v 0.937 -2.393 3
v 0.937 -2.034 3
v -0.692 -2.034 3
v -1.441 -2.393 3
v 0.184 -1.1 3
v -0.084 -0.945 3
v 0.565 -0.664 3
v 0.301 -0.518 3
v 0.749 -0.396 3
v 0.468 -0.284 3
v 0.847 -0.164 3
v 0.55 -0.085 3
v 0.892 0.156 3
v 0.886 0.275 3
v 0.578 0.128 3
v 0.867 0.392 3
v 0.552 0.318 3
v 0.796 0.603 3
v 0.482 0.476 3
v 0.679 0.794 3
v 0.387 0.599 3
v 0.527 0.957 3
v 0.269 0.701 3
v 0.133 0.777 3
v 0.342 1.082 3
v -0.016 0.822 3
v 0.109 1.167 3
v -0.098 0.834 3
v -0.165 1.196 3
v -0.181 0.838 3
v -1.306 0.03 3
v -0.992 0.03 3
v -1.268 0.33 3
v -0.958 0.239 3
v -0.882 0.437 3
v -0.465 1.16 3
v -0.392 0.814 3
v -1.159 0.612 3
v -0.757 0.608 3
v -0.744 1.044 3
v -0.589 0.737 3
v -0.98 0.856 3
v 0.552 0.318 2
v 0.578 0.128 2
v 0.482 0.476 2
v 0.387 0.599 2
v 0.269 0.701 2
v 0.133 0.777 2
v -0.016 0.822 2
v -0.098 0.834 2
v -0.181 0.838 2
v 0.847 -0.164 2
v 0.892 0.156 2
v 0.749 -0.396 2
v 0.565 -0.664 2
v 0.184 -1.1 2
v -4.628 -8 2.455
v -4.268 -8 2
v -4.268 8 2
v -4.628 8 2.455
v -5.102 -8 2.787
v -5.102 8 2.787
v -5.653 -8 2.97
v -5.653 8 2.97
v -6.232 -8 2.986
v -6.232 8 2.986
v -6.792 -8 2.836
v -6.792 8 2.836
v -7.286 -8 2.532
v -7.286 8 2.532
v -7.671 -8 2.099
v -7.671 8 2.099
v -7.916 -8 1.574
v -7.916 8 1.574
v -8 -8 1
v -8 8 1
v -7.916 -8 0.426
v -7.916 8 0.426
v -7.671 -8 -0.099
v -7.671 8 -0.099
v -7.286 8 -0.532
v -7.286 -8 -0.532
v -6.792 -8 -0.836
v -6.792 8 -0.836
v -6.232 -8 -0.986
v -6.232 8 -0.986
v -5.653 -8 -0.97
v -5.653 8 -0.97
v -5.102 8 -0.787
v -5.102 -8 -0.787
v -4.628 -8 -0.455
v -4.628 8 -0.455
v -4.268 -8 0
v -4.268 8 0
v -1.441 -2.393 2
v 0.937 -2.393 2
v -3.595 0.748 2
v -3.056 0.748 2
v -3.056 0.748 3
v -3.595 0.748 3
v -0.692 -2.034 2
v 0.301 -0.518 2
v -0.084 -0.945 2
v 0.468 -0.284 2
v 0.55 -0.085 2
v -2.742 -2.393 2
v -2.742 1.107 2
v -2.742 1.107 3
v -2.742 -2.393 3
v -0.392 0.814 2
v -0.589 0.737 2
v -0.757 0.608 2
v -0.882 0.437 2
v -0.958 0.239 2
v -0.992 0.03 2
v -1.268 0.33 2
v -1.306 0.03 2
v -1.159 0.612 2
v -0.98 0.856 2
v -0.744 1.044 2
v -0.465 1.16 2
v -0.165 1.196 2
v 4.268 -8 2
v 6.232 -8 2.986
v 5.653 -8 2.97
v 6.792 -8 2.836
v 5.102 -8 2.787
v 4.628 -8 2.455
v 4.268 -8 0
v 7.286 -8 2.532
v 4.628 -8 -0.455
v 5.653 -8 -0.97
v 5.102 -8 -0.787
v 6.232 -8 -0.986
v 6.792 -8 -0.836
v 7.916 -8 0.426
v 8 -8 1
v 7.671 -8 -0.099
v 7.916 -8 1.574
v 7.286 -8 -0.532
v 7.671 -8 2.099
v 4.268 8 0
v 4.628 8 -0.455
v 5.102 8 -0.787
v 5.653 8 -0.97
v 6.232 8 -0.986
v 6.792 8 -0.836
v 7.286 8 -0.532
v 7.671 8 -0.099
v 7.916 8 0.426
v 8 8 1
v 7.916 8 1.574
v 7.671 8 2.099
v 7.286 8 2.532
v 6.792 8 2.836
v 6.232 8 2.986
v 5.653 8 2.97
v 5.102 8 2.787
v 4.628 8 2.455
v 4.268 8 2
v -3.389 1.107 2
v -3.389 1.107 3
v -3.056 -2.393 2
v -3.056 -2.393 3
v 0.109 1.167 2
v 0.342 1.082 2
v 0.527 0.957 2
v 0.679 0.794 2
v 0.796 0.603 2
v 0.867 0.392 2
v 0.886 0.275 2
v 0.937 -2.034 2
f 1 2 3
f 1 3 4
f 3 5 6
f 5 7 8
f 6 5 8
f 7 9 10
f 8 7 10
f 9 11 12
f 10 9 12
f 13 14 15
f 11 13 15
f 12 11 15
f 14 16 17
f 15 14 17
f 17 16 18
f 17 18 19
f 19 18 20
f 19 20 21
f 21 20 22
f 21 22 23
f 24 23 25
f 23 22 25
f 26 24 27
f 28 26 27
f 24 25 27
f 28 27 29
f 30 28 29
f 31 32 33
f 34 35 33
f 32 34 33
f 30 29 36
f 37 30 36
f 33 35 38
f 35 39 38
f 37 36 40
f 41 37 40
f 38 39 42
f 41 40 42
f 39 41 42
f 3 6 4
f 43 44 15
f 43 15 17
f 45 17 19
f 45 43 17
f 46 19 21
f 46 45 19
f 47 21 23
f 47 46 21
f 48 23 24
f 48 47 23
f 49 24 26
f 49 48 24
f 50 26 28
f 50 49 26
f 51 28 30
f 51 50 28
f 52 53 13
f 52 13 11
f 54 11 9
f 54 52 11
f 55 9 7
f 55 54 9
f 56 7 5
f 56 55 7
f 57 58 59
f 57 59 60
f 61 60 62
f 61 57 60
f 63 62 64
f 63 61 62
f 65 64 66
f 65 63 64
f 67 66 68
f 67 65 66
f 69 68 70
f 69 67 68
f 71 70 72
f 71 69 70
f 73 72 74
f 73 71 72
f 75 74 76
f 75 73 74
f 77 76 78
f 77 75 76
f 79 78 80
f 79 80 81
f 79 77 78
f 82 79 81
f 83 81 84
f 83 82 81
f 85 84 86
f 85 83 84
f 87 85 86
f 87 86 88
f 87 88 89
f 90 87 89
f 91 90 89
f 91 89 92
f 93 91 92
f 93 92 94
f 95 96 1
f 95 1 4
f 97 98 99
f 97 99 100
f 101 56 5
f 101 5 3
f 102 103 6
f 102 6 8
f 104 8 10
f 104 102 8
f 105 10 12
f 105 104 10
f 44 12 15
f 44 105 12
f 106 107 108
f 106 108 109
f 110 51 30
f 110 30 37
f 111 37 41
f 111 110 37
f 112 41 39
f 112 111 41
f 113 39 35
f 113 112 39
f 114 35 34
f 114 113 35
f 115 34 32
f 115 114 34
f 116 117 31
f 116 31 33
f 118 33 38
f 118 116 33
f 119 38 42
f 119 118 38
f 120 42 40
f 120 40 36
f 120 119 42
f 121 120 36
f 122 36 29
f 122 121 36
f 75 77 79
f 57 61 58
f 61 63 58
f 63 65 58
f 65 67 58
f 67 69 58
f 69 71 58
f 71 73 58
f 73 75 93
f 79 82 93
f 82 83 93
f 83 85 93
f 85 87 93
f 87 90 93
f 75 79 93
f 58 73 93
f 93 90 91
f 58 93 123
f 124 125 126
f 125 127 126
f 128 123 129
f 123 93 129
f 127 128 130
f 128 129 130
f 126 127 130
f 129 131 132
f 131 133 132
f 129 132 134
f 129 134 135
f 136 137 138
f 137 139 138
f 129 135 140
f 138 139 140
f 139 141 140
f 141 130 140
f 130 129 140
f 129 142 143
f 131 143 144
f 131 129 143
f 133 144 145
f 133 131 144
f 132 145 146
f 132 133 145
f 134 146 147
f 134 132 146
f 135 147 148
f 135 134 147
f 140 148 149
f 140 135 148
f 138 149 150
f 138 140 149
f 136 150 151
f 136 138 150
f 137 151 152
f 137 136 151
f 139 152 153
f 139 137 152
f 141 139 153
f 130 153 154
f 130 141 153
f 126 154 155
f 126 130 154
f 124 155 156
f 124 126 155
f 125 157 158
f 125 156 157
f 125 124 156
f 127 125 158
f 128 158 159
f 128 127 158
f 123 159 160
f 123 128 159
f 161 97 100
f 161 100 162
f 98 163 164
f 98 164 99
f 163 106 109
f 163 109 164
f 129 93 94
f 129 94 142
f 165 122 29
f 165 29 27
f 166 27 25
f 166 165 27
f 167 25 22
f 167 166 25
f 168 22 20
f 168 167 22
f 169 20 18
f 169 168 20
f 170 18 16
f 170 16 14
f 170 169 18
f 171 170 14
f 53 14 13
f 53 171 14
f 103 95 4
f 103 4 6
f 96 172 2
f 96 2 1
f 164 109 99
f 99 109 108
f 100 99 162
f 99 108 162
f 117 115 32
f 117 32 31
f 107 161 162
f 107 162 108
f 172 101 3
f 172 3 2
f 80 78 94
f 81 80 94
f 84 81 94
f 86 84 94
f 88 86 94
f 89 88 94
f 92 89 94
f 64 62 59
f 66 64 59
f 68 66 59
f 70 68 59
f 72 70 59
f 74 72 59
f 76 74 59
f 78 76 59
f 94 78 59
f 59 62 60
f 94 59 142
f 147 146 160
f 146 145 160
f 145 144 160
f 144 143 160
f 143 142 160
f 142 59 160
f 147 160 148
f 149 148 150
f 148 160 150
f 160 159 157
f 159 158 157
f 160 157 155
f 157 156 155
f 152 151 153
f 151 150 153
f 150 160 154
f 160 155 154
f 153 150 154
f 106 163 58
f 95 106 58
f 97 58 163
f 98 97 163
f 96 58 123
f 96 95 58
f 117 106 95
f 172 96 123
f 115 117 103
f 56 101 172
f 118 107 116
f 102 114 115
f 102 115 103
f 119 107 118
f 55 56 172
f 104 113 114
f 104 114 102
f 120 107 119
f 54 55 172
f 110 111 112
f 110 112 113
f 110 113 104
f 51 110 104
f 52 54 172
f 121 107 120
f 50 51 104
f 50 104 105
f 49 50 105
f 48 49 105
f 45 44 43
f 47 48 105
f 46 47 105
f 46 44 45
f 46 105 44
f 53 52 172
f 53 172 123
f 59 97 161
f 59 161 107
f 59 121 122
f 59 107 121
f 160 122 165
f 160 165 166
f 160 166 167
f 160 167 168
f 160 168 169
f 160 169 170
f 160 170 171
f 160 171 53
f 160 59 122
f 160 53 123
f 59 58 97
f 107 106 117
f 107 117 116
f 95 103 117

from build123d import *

# Parameters (mm, degrees)
SKETCH1_W           = 12
SKETCH1_H           = 16
BOSS_EXTRUDE1_DEPTH = 2
SKETCH4_R           = 2
BOSS_EXTRUDE4_DEPTH = 16
BOSS_EXTRUDE5_DEPTH = 1


with BuildPart() as part:
    # Sketch1 → Boss-Extrude1 (new body)
    with BuildSketch(Plane.XY):
        Rectangle(SKETCH1_W, SKETCH1_H)
    extrude(amount=BOSS_EXTRUDE1_DEPTH)

    # Sketch4 → Boss-Extrude4 (add)
    with BuildSketch(Plane.XZ.offset(8)):
        with Locations((-6, 1)):
            Circle(SKETCH4_R)
        with Locations((6, 1)):
            Circle(SKETCH4_R)
    extrude(amount=-BOSS_EXTRUDE4_DEPTH)

    # Sketch5 → Boss-Extrude5 (add)
    with BuildSketch(Plane.XY.offset(2)):
        Polygon((-3.389443583, 1.106736913), (-2.742308167, 1.106736913), (-2.742308167, -2.393263087), (-3.056410731, -2.393263087), (-3.056410731, 0.747762554), (-3.594872269, 0.747762554), align=None)
        with BuildLine():
            Line((-0.992308167, 0.029813837), (-1.306410731, 0.029813837))
            add(Edge.make_bspline(
                [(-1.306410731, 0.029813837), (-1.304363578, 0.071484724), (-1.300343024, 0.153325239), (-1.281514735, 0.272649145), (-1.254573857, 0.386703944), (-1.216482403, 0.494573858), (-1.169176126, 0.597212665), (-1.112446098, 0.694212681), (-1.045252248, 0.78520387), (-0.969045514, 0.869342713), (-0.886276875, 0.946530284), (-0.796970935, 1.013185526), (-0.703125908, 1.069503198), (-0.605026509, 1.11658444), (-0.501565945, 1.151924286), (-0.393683087, 1.178145925), (-0.280903951, 1.193922271), (-0.204063929, 1.195618057), (-0.164984449, 1.196480503)],
                knots=[0, 0, 0, 0, 0.000125083, 0.00024566, 0.000361805, 0.000476223, 0.000588214, 0.000700404, 0.000812728, 0.00092691, 0.001040529, 0.001151727, 0.001260545, 0.001368429, 0.001477521, 0.001587884, 0.001701119, 0.00181831, 0.00181831, 0.00181831, 0.00181831], degree=3))
            add(Edge.make_bspline(
                [(-0.164984449, 1.196480503), (-0.126606375, 1.195582047), (-0.05119483, 1.193816612), (0.058867184, 1.178655583), (0.163644479, 1.154909991), (0.262932245, 1.121594575), (0.35593831, 1.076810147), (0.443361354, 1.023012609), (0.526242165, 0.960792777), (0.600848949, 0.887538964), (0.669357028, 0.809336579), (0.728459283, 0.725848676), (0.779072447, 0.63961939), (0.821260127, 0.549991188), (0.852316266, 0.45612016), (0.875894474, 0.359372957), (0.889221887, 0.258748146), (0.891267311, 0.190641591), (0.892307218, 0.15601576)],
                knots=[0, 0, 0, 0, 0.000115089, 0.000226145, 0.000332614, 0.000437044, 0.000539592, 0.000641561, 0.000744629, 0.00084975, 0.000954621, 0.001056175, 0.001156101, 0.001254284, 0.001352726, 0.001452208, 0.001552655, 0.001656537, 0.001656537, 0.001656537, 0.001656537], degree=3))
            add(Edge.make_bspline(
                [(0.892307218, 0.15601576), (0.890613955, 0.107267925), (0.887257144, 0.010627711), (0.858542767, -0.131387151), (0.813696256, -0.26898057), (0.759698899, -0.379717873), (0.705226455, -0.468951366), (0.656138947, -0.542420071), (0.598674136, -0.62152554), (0.531995638, -0.706002877), (0.457482766, -0.796513782), (0.374460603, -0.893003578), (0.282337121, -0.994475347), (0.21767862, -1.063780949), (0.184174205, -1.099693375)],
                knots=[0, 0, 0, 0, 0.000146118, 0.000289672, 0.0004329, 0.00057934, 0.000657978, 0.000746456, 0.000844345, 0.000951219, 0.001069268, 0.00119604, 0.001333047, 0.001480391, 0.001480391, 0.001480391, 0.001480391], degree=3))
            Line((0.184174205, -1.099693375), (-0.691526917, -2.034288728))
            Line((-0.691526917, -2.034288728), (0.937179013, -2.034288728))
            Line((0.937179013, -2.034288728), (0.937179013, -2.393263087))
            Line((0.937179013, -2.393263087), (-1.441026116, -2.393263087))
            Line((-1.441026116, -2.393263087), (-0.083654321, -0.944745458))
            add(Edge.make_bspline(
                [(-0.083654321, -0.944745458), (-0.050606434, -0.910247152), (0.012871793, -0.843982965), (0.10265437, -0.747240005), (0.183293358, -0.657490464), (0.255310751, -0.574903916), (0.317144257, -0.498272348), (0.372016488, -0.430077645), (0.415982079, -0.367323194), (0.463697475, -0.29458258), (0.509911457, -0.205770263), (0.549623813, -0.097236574), (0.573838661, 0.014490679), (0.576743497, 0.089992716), (0.578204654, 0.127970888)],
                knots=[0, 0, 0, 0, 0.000143319, 0.000275286, 0.00039593, 0.000505287, 0.000603949, 0.000691331, 0.000767782, 0.00083371, 0.000952247, 0.001067137, 0.001179618, 0.001293462, 0.001293462, 0.001293462, 0.001293462], degree=3))
            add(Edge.make_bspline(
                [(0.578204654, 0.127970888), (0.577568911, 0.151852286), (0.576315985, 0.198917937), (0.565258288, 0.267923696), (0.548547782, 0.334488509), (0.524602524, 0.398817129), (0.492995784, 0.460262781), (0.454522404, 0.518900261), (0.41013234, 0.575589226), (0.358781071, 0.628742524), (0.302369551, 0.67742373), (0.242775302, 0.720547815), (0.179725197, 0.756586926), (0.113485075, 0.786130423), (0.044239606, 0.809305804), (-0.028145139, 0.825364384), (-0.103469156, 0.835446867), (-0.154902651, 0.836811039), (-0.18111025, 0.837506144)],
                knots=[0, 0, 0, 0, 7.16e-05, 0.00014111, 0.00020913, 0.00027724, 0.000346538, 0.000415963, 0.000487357, 0.000562233, 0.000637292, 0.000710646, 0.000782564, 0.000854749, 0.000927915, 0.001001225, 0.001076884, 0.001155488, 0.001155488, 0.001155488, 0.001155488], degree=3))
            add(Edge.make_bspline(
                [(-0.18111025, 0.837506144), (-0.208481083, 0.836791112), (-0.262232879, 0.835386907), (-0.341151912, 0.825564243), (-0.41643769, 0.808618402), (-0.488279593, 0.785441728), (-0.556799178, 0.755983179), (-0.621663222, 0.719291434), (-0.682726112, 0.675507941), (-0.740102635, 0.625867385), (-0.792966614, 0.570599784), (-0.83941349, 0.508989821), (-0.879997504, 0.442162405), (-0.915406738, 0.370297855), (-0.944162428, 0.292744075), (-0.966135578, 0.20977637), (-0.983522425, 0.121754988), (-0.989330945, 0.060969904), (-0.992308167, 0.029813837)],
                knots=[0, 0, 0, 0, 8.2106e-05, 0.000161243, 0.000238127, 0.000313291, 0.000387401, 0.000461495, 0.000536397, 0.000612445, 0.000688819, 0.000765383, 0.000843422, 0.000923066, 0.001005373, 0.001091093, 0.001180334, 0.001274175, 0.001274175, 0.001274175, 0.001274175], degree=3))
        make_face()
    extrude(amount=BOSS_EXTRUDE5_DEPTH)


solid = part.part
